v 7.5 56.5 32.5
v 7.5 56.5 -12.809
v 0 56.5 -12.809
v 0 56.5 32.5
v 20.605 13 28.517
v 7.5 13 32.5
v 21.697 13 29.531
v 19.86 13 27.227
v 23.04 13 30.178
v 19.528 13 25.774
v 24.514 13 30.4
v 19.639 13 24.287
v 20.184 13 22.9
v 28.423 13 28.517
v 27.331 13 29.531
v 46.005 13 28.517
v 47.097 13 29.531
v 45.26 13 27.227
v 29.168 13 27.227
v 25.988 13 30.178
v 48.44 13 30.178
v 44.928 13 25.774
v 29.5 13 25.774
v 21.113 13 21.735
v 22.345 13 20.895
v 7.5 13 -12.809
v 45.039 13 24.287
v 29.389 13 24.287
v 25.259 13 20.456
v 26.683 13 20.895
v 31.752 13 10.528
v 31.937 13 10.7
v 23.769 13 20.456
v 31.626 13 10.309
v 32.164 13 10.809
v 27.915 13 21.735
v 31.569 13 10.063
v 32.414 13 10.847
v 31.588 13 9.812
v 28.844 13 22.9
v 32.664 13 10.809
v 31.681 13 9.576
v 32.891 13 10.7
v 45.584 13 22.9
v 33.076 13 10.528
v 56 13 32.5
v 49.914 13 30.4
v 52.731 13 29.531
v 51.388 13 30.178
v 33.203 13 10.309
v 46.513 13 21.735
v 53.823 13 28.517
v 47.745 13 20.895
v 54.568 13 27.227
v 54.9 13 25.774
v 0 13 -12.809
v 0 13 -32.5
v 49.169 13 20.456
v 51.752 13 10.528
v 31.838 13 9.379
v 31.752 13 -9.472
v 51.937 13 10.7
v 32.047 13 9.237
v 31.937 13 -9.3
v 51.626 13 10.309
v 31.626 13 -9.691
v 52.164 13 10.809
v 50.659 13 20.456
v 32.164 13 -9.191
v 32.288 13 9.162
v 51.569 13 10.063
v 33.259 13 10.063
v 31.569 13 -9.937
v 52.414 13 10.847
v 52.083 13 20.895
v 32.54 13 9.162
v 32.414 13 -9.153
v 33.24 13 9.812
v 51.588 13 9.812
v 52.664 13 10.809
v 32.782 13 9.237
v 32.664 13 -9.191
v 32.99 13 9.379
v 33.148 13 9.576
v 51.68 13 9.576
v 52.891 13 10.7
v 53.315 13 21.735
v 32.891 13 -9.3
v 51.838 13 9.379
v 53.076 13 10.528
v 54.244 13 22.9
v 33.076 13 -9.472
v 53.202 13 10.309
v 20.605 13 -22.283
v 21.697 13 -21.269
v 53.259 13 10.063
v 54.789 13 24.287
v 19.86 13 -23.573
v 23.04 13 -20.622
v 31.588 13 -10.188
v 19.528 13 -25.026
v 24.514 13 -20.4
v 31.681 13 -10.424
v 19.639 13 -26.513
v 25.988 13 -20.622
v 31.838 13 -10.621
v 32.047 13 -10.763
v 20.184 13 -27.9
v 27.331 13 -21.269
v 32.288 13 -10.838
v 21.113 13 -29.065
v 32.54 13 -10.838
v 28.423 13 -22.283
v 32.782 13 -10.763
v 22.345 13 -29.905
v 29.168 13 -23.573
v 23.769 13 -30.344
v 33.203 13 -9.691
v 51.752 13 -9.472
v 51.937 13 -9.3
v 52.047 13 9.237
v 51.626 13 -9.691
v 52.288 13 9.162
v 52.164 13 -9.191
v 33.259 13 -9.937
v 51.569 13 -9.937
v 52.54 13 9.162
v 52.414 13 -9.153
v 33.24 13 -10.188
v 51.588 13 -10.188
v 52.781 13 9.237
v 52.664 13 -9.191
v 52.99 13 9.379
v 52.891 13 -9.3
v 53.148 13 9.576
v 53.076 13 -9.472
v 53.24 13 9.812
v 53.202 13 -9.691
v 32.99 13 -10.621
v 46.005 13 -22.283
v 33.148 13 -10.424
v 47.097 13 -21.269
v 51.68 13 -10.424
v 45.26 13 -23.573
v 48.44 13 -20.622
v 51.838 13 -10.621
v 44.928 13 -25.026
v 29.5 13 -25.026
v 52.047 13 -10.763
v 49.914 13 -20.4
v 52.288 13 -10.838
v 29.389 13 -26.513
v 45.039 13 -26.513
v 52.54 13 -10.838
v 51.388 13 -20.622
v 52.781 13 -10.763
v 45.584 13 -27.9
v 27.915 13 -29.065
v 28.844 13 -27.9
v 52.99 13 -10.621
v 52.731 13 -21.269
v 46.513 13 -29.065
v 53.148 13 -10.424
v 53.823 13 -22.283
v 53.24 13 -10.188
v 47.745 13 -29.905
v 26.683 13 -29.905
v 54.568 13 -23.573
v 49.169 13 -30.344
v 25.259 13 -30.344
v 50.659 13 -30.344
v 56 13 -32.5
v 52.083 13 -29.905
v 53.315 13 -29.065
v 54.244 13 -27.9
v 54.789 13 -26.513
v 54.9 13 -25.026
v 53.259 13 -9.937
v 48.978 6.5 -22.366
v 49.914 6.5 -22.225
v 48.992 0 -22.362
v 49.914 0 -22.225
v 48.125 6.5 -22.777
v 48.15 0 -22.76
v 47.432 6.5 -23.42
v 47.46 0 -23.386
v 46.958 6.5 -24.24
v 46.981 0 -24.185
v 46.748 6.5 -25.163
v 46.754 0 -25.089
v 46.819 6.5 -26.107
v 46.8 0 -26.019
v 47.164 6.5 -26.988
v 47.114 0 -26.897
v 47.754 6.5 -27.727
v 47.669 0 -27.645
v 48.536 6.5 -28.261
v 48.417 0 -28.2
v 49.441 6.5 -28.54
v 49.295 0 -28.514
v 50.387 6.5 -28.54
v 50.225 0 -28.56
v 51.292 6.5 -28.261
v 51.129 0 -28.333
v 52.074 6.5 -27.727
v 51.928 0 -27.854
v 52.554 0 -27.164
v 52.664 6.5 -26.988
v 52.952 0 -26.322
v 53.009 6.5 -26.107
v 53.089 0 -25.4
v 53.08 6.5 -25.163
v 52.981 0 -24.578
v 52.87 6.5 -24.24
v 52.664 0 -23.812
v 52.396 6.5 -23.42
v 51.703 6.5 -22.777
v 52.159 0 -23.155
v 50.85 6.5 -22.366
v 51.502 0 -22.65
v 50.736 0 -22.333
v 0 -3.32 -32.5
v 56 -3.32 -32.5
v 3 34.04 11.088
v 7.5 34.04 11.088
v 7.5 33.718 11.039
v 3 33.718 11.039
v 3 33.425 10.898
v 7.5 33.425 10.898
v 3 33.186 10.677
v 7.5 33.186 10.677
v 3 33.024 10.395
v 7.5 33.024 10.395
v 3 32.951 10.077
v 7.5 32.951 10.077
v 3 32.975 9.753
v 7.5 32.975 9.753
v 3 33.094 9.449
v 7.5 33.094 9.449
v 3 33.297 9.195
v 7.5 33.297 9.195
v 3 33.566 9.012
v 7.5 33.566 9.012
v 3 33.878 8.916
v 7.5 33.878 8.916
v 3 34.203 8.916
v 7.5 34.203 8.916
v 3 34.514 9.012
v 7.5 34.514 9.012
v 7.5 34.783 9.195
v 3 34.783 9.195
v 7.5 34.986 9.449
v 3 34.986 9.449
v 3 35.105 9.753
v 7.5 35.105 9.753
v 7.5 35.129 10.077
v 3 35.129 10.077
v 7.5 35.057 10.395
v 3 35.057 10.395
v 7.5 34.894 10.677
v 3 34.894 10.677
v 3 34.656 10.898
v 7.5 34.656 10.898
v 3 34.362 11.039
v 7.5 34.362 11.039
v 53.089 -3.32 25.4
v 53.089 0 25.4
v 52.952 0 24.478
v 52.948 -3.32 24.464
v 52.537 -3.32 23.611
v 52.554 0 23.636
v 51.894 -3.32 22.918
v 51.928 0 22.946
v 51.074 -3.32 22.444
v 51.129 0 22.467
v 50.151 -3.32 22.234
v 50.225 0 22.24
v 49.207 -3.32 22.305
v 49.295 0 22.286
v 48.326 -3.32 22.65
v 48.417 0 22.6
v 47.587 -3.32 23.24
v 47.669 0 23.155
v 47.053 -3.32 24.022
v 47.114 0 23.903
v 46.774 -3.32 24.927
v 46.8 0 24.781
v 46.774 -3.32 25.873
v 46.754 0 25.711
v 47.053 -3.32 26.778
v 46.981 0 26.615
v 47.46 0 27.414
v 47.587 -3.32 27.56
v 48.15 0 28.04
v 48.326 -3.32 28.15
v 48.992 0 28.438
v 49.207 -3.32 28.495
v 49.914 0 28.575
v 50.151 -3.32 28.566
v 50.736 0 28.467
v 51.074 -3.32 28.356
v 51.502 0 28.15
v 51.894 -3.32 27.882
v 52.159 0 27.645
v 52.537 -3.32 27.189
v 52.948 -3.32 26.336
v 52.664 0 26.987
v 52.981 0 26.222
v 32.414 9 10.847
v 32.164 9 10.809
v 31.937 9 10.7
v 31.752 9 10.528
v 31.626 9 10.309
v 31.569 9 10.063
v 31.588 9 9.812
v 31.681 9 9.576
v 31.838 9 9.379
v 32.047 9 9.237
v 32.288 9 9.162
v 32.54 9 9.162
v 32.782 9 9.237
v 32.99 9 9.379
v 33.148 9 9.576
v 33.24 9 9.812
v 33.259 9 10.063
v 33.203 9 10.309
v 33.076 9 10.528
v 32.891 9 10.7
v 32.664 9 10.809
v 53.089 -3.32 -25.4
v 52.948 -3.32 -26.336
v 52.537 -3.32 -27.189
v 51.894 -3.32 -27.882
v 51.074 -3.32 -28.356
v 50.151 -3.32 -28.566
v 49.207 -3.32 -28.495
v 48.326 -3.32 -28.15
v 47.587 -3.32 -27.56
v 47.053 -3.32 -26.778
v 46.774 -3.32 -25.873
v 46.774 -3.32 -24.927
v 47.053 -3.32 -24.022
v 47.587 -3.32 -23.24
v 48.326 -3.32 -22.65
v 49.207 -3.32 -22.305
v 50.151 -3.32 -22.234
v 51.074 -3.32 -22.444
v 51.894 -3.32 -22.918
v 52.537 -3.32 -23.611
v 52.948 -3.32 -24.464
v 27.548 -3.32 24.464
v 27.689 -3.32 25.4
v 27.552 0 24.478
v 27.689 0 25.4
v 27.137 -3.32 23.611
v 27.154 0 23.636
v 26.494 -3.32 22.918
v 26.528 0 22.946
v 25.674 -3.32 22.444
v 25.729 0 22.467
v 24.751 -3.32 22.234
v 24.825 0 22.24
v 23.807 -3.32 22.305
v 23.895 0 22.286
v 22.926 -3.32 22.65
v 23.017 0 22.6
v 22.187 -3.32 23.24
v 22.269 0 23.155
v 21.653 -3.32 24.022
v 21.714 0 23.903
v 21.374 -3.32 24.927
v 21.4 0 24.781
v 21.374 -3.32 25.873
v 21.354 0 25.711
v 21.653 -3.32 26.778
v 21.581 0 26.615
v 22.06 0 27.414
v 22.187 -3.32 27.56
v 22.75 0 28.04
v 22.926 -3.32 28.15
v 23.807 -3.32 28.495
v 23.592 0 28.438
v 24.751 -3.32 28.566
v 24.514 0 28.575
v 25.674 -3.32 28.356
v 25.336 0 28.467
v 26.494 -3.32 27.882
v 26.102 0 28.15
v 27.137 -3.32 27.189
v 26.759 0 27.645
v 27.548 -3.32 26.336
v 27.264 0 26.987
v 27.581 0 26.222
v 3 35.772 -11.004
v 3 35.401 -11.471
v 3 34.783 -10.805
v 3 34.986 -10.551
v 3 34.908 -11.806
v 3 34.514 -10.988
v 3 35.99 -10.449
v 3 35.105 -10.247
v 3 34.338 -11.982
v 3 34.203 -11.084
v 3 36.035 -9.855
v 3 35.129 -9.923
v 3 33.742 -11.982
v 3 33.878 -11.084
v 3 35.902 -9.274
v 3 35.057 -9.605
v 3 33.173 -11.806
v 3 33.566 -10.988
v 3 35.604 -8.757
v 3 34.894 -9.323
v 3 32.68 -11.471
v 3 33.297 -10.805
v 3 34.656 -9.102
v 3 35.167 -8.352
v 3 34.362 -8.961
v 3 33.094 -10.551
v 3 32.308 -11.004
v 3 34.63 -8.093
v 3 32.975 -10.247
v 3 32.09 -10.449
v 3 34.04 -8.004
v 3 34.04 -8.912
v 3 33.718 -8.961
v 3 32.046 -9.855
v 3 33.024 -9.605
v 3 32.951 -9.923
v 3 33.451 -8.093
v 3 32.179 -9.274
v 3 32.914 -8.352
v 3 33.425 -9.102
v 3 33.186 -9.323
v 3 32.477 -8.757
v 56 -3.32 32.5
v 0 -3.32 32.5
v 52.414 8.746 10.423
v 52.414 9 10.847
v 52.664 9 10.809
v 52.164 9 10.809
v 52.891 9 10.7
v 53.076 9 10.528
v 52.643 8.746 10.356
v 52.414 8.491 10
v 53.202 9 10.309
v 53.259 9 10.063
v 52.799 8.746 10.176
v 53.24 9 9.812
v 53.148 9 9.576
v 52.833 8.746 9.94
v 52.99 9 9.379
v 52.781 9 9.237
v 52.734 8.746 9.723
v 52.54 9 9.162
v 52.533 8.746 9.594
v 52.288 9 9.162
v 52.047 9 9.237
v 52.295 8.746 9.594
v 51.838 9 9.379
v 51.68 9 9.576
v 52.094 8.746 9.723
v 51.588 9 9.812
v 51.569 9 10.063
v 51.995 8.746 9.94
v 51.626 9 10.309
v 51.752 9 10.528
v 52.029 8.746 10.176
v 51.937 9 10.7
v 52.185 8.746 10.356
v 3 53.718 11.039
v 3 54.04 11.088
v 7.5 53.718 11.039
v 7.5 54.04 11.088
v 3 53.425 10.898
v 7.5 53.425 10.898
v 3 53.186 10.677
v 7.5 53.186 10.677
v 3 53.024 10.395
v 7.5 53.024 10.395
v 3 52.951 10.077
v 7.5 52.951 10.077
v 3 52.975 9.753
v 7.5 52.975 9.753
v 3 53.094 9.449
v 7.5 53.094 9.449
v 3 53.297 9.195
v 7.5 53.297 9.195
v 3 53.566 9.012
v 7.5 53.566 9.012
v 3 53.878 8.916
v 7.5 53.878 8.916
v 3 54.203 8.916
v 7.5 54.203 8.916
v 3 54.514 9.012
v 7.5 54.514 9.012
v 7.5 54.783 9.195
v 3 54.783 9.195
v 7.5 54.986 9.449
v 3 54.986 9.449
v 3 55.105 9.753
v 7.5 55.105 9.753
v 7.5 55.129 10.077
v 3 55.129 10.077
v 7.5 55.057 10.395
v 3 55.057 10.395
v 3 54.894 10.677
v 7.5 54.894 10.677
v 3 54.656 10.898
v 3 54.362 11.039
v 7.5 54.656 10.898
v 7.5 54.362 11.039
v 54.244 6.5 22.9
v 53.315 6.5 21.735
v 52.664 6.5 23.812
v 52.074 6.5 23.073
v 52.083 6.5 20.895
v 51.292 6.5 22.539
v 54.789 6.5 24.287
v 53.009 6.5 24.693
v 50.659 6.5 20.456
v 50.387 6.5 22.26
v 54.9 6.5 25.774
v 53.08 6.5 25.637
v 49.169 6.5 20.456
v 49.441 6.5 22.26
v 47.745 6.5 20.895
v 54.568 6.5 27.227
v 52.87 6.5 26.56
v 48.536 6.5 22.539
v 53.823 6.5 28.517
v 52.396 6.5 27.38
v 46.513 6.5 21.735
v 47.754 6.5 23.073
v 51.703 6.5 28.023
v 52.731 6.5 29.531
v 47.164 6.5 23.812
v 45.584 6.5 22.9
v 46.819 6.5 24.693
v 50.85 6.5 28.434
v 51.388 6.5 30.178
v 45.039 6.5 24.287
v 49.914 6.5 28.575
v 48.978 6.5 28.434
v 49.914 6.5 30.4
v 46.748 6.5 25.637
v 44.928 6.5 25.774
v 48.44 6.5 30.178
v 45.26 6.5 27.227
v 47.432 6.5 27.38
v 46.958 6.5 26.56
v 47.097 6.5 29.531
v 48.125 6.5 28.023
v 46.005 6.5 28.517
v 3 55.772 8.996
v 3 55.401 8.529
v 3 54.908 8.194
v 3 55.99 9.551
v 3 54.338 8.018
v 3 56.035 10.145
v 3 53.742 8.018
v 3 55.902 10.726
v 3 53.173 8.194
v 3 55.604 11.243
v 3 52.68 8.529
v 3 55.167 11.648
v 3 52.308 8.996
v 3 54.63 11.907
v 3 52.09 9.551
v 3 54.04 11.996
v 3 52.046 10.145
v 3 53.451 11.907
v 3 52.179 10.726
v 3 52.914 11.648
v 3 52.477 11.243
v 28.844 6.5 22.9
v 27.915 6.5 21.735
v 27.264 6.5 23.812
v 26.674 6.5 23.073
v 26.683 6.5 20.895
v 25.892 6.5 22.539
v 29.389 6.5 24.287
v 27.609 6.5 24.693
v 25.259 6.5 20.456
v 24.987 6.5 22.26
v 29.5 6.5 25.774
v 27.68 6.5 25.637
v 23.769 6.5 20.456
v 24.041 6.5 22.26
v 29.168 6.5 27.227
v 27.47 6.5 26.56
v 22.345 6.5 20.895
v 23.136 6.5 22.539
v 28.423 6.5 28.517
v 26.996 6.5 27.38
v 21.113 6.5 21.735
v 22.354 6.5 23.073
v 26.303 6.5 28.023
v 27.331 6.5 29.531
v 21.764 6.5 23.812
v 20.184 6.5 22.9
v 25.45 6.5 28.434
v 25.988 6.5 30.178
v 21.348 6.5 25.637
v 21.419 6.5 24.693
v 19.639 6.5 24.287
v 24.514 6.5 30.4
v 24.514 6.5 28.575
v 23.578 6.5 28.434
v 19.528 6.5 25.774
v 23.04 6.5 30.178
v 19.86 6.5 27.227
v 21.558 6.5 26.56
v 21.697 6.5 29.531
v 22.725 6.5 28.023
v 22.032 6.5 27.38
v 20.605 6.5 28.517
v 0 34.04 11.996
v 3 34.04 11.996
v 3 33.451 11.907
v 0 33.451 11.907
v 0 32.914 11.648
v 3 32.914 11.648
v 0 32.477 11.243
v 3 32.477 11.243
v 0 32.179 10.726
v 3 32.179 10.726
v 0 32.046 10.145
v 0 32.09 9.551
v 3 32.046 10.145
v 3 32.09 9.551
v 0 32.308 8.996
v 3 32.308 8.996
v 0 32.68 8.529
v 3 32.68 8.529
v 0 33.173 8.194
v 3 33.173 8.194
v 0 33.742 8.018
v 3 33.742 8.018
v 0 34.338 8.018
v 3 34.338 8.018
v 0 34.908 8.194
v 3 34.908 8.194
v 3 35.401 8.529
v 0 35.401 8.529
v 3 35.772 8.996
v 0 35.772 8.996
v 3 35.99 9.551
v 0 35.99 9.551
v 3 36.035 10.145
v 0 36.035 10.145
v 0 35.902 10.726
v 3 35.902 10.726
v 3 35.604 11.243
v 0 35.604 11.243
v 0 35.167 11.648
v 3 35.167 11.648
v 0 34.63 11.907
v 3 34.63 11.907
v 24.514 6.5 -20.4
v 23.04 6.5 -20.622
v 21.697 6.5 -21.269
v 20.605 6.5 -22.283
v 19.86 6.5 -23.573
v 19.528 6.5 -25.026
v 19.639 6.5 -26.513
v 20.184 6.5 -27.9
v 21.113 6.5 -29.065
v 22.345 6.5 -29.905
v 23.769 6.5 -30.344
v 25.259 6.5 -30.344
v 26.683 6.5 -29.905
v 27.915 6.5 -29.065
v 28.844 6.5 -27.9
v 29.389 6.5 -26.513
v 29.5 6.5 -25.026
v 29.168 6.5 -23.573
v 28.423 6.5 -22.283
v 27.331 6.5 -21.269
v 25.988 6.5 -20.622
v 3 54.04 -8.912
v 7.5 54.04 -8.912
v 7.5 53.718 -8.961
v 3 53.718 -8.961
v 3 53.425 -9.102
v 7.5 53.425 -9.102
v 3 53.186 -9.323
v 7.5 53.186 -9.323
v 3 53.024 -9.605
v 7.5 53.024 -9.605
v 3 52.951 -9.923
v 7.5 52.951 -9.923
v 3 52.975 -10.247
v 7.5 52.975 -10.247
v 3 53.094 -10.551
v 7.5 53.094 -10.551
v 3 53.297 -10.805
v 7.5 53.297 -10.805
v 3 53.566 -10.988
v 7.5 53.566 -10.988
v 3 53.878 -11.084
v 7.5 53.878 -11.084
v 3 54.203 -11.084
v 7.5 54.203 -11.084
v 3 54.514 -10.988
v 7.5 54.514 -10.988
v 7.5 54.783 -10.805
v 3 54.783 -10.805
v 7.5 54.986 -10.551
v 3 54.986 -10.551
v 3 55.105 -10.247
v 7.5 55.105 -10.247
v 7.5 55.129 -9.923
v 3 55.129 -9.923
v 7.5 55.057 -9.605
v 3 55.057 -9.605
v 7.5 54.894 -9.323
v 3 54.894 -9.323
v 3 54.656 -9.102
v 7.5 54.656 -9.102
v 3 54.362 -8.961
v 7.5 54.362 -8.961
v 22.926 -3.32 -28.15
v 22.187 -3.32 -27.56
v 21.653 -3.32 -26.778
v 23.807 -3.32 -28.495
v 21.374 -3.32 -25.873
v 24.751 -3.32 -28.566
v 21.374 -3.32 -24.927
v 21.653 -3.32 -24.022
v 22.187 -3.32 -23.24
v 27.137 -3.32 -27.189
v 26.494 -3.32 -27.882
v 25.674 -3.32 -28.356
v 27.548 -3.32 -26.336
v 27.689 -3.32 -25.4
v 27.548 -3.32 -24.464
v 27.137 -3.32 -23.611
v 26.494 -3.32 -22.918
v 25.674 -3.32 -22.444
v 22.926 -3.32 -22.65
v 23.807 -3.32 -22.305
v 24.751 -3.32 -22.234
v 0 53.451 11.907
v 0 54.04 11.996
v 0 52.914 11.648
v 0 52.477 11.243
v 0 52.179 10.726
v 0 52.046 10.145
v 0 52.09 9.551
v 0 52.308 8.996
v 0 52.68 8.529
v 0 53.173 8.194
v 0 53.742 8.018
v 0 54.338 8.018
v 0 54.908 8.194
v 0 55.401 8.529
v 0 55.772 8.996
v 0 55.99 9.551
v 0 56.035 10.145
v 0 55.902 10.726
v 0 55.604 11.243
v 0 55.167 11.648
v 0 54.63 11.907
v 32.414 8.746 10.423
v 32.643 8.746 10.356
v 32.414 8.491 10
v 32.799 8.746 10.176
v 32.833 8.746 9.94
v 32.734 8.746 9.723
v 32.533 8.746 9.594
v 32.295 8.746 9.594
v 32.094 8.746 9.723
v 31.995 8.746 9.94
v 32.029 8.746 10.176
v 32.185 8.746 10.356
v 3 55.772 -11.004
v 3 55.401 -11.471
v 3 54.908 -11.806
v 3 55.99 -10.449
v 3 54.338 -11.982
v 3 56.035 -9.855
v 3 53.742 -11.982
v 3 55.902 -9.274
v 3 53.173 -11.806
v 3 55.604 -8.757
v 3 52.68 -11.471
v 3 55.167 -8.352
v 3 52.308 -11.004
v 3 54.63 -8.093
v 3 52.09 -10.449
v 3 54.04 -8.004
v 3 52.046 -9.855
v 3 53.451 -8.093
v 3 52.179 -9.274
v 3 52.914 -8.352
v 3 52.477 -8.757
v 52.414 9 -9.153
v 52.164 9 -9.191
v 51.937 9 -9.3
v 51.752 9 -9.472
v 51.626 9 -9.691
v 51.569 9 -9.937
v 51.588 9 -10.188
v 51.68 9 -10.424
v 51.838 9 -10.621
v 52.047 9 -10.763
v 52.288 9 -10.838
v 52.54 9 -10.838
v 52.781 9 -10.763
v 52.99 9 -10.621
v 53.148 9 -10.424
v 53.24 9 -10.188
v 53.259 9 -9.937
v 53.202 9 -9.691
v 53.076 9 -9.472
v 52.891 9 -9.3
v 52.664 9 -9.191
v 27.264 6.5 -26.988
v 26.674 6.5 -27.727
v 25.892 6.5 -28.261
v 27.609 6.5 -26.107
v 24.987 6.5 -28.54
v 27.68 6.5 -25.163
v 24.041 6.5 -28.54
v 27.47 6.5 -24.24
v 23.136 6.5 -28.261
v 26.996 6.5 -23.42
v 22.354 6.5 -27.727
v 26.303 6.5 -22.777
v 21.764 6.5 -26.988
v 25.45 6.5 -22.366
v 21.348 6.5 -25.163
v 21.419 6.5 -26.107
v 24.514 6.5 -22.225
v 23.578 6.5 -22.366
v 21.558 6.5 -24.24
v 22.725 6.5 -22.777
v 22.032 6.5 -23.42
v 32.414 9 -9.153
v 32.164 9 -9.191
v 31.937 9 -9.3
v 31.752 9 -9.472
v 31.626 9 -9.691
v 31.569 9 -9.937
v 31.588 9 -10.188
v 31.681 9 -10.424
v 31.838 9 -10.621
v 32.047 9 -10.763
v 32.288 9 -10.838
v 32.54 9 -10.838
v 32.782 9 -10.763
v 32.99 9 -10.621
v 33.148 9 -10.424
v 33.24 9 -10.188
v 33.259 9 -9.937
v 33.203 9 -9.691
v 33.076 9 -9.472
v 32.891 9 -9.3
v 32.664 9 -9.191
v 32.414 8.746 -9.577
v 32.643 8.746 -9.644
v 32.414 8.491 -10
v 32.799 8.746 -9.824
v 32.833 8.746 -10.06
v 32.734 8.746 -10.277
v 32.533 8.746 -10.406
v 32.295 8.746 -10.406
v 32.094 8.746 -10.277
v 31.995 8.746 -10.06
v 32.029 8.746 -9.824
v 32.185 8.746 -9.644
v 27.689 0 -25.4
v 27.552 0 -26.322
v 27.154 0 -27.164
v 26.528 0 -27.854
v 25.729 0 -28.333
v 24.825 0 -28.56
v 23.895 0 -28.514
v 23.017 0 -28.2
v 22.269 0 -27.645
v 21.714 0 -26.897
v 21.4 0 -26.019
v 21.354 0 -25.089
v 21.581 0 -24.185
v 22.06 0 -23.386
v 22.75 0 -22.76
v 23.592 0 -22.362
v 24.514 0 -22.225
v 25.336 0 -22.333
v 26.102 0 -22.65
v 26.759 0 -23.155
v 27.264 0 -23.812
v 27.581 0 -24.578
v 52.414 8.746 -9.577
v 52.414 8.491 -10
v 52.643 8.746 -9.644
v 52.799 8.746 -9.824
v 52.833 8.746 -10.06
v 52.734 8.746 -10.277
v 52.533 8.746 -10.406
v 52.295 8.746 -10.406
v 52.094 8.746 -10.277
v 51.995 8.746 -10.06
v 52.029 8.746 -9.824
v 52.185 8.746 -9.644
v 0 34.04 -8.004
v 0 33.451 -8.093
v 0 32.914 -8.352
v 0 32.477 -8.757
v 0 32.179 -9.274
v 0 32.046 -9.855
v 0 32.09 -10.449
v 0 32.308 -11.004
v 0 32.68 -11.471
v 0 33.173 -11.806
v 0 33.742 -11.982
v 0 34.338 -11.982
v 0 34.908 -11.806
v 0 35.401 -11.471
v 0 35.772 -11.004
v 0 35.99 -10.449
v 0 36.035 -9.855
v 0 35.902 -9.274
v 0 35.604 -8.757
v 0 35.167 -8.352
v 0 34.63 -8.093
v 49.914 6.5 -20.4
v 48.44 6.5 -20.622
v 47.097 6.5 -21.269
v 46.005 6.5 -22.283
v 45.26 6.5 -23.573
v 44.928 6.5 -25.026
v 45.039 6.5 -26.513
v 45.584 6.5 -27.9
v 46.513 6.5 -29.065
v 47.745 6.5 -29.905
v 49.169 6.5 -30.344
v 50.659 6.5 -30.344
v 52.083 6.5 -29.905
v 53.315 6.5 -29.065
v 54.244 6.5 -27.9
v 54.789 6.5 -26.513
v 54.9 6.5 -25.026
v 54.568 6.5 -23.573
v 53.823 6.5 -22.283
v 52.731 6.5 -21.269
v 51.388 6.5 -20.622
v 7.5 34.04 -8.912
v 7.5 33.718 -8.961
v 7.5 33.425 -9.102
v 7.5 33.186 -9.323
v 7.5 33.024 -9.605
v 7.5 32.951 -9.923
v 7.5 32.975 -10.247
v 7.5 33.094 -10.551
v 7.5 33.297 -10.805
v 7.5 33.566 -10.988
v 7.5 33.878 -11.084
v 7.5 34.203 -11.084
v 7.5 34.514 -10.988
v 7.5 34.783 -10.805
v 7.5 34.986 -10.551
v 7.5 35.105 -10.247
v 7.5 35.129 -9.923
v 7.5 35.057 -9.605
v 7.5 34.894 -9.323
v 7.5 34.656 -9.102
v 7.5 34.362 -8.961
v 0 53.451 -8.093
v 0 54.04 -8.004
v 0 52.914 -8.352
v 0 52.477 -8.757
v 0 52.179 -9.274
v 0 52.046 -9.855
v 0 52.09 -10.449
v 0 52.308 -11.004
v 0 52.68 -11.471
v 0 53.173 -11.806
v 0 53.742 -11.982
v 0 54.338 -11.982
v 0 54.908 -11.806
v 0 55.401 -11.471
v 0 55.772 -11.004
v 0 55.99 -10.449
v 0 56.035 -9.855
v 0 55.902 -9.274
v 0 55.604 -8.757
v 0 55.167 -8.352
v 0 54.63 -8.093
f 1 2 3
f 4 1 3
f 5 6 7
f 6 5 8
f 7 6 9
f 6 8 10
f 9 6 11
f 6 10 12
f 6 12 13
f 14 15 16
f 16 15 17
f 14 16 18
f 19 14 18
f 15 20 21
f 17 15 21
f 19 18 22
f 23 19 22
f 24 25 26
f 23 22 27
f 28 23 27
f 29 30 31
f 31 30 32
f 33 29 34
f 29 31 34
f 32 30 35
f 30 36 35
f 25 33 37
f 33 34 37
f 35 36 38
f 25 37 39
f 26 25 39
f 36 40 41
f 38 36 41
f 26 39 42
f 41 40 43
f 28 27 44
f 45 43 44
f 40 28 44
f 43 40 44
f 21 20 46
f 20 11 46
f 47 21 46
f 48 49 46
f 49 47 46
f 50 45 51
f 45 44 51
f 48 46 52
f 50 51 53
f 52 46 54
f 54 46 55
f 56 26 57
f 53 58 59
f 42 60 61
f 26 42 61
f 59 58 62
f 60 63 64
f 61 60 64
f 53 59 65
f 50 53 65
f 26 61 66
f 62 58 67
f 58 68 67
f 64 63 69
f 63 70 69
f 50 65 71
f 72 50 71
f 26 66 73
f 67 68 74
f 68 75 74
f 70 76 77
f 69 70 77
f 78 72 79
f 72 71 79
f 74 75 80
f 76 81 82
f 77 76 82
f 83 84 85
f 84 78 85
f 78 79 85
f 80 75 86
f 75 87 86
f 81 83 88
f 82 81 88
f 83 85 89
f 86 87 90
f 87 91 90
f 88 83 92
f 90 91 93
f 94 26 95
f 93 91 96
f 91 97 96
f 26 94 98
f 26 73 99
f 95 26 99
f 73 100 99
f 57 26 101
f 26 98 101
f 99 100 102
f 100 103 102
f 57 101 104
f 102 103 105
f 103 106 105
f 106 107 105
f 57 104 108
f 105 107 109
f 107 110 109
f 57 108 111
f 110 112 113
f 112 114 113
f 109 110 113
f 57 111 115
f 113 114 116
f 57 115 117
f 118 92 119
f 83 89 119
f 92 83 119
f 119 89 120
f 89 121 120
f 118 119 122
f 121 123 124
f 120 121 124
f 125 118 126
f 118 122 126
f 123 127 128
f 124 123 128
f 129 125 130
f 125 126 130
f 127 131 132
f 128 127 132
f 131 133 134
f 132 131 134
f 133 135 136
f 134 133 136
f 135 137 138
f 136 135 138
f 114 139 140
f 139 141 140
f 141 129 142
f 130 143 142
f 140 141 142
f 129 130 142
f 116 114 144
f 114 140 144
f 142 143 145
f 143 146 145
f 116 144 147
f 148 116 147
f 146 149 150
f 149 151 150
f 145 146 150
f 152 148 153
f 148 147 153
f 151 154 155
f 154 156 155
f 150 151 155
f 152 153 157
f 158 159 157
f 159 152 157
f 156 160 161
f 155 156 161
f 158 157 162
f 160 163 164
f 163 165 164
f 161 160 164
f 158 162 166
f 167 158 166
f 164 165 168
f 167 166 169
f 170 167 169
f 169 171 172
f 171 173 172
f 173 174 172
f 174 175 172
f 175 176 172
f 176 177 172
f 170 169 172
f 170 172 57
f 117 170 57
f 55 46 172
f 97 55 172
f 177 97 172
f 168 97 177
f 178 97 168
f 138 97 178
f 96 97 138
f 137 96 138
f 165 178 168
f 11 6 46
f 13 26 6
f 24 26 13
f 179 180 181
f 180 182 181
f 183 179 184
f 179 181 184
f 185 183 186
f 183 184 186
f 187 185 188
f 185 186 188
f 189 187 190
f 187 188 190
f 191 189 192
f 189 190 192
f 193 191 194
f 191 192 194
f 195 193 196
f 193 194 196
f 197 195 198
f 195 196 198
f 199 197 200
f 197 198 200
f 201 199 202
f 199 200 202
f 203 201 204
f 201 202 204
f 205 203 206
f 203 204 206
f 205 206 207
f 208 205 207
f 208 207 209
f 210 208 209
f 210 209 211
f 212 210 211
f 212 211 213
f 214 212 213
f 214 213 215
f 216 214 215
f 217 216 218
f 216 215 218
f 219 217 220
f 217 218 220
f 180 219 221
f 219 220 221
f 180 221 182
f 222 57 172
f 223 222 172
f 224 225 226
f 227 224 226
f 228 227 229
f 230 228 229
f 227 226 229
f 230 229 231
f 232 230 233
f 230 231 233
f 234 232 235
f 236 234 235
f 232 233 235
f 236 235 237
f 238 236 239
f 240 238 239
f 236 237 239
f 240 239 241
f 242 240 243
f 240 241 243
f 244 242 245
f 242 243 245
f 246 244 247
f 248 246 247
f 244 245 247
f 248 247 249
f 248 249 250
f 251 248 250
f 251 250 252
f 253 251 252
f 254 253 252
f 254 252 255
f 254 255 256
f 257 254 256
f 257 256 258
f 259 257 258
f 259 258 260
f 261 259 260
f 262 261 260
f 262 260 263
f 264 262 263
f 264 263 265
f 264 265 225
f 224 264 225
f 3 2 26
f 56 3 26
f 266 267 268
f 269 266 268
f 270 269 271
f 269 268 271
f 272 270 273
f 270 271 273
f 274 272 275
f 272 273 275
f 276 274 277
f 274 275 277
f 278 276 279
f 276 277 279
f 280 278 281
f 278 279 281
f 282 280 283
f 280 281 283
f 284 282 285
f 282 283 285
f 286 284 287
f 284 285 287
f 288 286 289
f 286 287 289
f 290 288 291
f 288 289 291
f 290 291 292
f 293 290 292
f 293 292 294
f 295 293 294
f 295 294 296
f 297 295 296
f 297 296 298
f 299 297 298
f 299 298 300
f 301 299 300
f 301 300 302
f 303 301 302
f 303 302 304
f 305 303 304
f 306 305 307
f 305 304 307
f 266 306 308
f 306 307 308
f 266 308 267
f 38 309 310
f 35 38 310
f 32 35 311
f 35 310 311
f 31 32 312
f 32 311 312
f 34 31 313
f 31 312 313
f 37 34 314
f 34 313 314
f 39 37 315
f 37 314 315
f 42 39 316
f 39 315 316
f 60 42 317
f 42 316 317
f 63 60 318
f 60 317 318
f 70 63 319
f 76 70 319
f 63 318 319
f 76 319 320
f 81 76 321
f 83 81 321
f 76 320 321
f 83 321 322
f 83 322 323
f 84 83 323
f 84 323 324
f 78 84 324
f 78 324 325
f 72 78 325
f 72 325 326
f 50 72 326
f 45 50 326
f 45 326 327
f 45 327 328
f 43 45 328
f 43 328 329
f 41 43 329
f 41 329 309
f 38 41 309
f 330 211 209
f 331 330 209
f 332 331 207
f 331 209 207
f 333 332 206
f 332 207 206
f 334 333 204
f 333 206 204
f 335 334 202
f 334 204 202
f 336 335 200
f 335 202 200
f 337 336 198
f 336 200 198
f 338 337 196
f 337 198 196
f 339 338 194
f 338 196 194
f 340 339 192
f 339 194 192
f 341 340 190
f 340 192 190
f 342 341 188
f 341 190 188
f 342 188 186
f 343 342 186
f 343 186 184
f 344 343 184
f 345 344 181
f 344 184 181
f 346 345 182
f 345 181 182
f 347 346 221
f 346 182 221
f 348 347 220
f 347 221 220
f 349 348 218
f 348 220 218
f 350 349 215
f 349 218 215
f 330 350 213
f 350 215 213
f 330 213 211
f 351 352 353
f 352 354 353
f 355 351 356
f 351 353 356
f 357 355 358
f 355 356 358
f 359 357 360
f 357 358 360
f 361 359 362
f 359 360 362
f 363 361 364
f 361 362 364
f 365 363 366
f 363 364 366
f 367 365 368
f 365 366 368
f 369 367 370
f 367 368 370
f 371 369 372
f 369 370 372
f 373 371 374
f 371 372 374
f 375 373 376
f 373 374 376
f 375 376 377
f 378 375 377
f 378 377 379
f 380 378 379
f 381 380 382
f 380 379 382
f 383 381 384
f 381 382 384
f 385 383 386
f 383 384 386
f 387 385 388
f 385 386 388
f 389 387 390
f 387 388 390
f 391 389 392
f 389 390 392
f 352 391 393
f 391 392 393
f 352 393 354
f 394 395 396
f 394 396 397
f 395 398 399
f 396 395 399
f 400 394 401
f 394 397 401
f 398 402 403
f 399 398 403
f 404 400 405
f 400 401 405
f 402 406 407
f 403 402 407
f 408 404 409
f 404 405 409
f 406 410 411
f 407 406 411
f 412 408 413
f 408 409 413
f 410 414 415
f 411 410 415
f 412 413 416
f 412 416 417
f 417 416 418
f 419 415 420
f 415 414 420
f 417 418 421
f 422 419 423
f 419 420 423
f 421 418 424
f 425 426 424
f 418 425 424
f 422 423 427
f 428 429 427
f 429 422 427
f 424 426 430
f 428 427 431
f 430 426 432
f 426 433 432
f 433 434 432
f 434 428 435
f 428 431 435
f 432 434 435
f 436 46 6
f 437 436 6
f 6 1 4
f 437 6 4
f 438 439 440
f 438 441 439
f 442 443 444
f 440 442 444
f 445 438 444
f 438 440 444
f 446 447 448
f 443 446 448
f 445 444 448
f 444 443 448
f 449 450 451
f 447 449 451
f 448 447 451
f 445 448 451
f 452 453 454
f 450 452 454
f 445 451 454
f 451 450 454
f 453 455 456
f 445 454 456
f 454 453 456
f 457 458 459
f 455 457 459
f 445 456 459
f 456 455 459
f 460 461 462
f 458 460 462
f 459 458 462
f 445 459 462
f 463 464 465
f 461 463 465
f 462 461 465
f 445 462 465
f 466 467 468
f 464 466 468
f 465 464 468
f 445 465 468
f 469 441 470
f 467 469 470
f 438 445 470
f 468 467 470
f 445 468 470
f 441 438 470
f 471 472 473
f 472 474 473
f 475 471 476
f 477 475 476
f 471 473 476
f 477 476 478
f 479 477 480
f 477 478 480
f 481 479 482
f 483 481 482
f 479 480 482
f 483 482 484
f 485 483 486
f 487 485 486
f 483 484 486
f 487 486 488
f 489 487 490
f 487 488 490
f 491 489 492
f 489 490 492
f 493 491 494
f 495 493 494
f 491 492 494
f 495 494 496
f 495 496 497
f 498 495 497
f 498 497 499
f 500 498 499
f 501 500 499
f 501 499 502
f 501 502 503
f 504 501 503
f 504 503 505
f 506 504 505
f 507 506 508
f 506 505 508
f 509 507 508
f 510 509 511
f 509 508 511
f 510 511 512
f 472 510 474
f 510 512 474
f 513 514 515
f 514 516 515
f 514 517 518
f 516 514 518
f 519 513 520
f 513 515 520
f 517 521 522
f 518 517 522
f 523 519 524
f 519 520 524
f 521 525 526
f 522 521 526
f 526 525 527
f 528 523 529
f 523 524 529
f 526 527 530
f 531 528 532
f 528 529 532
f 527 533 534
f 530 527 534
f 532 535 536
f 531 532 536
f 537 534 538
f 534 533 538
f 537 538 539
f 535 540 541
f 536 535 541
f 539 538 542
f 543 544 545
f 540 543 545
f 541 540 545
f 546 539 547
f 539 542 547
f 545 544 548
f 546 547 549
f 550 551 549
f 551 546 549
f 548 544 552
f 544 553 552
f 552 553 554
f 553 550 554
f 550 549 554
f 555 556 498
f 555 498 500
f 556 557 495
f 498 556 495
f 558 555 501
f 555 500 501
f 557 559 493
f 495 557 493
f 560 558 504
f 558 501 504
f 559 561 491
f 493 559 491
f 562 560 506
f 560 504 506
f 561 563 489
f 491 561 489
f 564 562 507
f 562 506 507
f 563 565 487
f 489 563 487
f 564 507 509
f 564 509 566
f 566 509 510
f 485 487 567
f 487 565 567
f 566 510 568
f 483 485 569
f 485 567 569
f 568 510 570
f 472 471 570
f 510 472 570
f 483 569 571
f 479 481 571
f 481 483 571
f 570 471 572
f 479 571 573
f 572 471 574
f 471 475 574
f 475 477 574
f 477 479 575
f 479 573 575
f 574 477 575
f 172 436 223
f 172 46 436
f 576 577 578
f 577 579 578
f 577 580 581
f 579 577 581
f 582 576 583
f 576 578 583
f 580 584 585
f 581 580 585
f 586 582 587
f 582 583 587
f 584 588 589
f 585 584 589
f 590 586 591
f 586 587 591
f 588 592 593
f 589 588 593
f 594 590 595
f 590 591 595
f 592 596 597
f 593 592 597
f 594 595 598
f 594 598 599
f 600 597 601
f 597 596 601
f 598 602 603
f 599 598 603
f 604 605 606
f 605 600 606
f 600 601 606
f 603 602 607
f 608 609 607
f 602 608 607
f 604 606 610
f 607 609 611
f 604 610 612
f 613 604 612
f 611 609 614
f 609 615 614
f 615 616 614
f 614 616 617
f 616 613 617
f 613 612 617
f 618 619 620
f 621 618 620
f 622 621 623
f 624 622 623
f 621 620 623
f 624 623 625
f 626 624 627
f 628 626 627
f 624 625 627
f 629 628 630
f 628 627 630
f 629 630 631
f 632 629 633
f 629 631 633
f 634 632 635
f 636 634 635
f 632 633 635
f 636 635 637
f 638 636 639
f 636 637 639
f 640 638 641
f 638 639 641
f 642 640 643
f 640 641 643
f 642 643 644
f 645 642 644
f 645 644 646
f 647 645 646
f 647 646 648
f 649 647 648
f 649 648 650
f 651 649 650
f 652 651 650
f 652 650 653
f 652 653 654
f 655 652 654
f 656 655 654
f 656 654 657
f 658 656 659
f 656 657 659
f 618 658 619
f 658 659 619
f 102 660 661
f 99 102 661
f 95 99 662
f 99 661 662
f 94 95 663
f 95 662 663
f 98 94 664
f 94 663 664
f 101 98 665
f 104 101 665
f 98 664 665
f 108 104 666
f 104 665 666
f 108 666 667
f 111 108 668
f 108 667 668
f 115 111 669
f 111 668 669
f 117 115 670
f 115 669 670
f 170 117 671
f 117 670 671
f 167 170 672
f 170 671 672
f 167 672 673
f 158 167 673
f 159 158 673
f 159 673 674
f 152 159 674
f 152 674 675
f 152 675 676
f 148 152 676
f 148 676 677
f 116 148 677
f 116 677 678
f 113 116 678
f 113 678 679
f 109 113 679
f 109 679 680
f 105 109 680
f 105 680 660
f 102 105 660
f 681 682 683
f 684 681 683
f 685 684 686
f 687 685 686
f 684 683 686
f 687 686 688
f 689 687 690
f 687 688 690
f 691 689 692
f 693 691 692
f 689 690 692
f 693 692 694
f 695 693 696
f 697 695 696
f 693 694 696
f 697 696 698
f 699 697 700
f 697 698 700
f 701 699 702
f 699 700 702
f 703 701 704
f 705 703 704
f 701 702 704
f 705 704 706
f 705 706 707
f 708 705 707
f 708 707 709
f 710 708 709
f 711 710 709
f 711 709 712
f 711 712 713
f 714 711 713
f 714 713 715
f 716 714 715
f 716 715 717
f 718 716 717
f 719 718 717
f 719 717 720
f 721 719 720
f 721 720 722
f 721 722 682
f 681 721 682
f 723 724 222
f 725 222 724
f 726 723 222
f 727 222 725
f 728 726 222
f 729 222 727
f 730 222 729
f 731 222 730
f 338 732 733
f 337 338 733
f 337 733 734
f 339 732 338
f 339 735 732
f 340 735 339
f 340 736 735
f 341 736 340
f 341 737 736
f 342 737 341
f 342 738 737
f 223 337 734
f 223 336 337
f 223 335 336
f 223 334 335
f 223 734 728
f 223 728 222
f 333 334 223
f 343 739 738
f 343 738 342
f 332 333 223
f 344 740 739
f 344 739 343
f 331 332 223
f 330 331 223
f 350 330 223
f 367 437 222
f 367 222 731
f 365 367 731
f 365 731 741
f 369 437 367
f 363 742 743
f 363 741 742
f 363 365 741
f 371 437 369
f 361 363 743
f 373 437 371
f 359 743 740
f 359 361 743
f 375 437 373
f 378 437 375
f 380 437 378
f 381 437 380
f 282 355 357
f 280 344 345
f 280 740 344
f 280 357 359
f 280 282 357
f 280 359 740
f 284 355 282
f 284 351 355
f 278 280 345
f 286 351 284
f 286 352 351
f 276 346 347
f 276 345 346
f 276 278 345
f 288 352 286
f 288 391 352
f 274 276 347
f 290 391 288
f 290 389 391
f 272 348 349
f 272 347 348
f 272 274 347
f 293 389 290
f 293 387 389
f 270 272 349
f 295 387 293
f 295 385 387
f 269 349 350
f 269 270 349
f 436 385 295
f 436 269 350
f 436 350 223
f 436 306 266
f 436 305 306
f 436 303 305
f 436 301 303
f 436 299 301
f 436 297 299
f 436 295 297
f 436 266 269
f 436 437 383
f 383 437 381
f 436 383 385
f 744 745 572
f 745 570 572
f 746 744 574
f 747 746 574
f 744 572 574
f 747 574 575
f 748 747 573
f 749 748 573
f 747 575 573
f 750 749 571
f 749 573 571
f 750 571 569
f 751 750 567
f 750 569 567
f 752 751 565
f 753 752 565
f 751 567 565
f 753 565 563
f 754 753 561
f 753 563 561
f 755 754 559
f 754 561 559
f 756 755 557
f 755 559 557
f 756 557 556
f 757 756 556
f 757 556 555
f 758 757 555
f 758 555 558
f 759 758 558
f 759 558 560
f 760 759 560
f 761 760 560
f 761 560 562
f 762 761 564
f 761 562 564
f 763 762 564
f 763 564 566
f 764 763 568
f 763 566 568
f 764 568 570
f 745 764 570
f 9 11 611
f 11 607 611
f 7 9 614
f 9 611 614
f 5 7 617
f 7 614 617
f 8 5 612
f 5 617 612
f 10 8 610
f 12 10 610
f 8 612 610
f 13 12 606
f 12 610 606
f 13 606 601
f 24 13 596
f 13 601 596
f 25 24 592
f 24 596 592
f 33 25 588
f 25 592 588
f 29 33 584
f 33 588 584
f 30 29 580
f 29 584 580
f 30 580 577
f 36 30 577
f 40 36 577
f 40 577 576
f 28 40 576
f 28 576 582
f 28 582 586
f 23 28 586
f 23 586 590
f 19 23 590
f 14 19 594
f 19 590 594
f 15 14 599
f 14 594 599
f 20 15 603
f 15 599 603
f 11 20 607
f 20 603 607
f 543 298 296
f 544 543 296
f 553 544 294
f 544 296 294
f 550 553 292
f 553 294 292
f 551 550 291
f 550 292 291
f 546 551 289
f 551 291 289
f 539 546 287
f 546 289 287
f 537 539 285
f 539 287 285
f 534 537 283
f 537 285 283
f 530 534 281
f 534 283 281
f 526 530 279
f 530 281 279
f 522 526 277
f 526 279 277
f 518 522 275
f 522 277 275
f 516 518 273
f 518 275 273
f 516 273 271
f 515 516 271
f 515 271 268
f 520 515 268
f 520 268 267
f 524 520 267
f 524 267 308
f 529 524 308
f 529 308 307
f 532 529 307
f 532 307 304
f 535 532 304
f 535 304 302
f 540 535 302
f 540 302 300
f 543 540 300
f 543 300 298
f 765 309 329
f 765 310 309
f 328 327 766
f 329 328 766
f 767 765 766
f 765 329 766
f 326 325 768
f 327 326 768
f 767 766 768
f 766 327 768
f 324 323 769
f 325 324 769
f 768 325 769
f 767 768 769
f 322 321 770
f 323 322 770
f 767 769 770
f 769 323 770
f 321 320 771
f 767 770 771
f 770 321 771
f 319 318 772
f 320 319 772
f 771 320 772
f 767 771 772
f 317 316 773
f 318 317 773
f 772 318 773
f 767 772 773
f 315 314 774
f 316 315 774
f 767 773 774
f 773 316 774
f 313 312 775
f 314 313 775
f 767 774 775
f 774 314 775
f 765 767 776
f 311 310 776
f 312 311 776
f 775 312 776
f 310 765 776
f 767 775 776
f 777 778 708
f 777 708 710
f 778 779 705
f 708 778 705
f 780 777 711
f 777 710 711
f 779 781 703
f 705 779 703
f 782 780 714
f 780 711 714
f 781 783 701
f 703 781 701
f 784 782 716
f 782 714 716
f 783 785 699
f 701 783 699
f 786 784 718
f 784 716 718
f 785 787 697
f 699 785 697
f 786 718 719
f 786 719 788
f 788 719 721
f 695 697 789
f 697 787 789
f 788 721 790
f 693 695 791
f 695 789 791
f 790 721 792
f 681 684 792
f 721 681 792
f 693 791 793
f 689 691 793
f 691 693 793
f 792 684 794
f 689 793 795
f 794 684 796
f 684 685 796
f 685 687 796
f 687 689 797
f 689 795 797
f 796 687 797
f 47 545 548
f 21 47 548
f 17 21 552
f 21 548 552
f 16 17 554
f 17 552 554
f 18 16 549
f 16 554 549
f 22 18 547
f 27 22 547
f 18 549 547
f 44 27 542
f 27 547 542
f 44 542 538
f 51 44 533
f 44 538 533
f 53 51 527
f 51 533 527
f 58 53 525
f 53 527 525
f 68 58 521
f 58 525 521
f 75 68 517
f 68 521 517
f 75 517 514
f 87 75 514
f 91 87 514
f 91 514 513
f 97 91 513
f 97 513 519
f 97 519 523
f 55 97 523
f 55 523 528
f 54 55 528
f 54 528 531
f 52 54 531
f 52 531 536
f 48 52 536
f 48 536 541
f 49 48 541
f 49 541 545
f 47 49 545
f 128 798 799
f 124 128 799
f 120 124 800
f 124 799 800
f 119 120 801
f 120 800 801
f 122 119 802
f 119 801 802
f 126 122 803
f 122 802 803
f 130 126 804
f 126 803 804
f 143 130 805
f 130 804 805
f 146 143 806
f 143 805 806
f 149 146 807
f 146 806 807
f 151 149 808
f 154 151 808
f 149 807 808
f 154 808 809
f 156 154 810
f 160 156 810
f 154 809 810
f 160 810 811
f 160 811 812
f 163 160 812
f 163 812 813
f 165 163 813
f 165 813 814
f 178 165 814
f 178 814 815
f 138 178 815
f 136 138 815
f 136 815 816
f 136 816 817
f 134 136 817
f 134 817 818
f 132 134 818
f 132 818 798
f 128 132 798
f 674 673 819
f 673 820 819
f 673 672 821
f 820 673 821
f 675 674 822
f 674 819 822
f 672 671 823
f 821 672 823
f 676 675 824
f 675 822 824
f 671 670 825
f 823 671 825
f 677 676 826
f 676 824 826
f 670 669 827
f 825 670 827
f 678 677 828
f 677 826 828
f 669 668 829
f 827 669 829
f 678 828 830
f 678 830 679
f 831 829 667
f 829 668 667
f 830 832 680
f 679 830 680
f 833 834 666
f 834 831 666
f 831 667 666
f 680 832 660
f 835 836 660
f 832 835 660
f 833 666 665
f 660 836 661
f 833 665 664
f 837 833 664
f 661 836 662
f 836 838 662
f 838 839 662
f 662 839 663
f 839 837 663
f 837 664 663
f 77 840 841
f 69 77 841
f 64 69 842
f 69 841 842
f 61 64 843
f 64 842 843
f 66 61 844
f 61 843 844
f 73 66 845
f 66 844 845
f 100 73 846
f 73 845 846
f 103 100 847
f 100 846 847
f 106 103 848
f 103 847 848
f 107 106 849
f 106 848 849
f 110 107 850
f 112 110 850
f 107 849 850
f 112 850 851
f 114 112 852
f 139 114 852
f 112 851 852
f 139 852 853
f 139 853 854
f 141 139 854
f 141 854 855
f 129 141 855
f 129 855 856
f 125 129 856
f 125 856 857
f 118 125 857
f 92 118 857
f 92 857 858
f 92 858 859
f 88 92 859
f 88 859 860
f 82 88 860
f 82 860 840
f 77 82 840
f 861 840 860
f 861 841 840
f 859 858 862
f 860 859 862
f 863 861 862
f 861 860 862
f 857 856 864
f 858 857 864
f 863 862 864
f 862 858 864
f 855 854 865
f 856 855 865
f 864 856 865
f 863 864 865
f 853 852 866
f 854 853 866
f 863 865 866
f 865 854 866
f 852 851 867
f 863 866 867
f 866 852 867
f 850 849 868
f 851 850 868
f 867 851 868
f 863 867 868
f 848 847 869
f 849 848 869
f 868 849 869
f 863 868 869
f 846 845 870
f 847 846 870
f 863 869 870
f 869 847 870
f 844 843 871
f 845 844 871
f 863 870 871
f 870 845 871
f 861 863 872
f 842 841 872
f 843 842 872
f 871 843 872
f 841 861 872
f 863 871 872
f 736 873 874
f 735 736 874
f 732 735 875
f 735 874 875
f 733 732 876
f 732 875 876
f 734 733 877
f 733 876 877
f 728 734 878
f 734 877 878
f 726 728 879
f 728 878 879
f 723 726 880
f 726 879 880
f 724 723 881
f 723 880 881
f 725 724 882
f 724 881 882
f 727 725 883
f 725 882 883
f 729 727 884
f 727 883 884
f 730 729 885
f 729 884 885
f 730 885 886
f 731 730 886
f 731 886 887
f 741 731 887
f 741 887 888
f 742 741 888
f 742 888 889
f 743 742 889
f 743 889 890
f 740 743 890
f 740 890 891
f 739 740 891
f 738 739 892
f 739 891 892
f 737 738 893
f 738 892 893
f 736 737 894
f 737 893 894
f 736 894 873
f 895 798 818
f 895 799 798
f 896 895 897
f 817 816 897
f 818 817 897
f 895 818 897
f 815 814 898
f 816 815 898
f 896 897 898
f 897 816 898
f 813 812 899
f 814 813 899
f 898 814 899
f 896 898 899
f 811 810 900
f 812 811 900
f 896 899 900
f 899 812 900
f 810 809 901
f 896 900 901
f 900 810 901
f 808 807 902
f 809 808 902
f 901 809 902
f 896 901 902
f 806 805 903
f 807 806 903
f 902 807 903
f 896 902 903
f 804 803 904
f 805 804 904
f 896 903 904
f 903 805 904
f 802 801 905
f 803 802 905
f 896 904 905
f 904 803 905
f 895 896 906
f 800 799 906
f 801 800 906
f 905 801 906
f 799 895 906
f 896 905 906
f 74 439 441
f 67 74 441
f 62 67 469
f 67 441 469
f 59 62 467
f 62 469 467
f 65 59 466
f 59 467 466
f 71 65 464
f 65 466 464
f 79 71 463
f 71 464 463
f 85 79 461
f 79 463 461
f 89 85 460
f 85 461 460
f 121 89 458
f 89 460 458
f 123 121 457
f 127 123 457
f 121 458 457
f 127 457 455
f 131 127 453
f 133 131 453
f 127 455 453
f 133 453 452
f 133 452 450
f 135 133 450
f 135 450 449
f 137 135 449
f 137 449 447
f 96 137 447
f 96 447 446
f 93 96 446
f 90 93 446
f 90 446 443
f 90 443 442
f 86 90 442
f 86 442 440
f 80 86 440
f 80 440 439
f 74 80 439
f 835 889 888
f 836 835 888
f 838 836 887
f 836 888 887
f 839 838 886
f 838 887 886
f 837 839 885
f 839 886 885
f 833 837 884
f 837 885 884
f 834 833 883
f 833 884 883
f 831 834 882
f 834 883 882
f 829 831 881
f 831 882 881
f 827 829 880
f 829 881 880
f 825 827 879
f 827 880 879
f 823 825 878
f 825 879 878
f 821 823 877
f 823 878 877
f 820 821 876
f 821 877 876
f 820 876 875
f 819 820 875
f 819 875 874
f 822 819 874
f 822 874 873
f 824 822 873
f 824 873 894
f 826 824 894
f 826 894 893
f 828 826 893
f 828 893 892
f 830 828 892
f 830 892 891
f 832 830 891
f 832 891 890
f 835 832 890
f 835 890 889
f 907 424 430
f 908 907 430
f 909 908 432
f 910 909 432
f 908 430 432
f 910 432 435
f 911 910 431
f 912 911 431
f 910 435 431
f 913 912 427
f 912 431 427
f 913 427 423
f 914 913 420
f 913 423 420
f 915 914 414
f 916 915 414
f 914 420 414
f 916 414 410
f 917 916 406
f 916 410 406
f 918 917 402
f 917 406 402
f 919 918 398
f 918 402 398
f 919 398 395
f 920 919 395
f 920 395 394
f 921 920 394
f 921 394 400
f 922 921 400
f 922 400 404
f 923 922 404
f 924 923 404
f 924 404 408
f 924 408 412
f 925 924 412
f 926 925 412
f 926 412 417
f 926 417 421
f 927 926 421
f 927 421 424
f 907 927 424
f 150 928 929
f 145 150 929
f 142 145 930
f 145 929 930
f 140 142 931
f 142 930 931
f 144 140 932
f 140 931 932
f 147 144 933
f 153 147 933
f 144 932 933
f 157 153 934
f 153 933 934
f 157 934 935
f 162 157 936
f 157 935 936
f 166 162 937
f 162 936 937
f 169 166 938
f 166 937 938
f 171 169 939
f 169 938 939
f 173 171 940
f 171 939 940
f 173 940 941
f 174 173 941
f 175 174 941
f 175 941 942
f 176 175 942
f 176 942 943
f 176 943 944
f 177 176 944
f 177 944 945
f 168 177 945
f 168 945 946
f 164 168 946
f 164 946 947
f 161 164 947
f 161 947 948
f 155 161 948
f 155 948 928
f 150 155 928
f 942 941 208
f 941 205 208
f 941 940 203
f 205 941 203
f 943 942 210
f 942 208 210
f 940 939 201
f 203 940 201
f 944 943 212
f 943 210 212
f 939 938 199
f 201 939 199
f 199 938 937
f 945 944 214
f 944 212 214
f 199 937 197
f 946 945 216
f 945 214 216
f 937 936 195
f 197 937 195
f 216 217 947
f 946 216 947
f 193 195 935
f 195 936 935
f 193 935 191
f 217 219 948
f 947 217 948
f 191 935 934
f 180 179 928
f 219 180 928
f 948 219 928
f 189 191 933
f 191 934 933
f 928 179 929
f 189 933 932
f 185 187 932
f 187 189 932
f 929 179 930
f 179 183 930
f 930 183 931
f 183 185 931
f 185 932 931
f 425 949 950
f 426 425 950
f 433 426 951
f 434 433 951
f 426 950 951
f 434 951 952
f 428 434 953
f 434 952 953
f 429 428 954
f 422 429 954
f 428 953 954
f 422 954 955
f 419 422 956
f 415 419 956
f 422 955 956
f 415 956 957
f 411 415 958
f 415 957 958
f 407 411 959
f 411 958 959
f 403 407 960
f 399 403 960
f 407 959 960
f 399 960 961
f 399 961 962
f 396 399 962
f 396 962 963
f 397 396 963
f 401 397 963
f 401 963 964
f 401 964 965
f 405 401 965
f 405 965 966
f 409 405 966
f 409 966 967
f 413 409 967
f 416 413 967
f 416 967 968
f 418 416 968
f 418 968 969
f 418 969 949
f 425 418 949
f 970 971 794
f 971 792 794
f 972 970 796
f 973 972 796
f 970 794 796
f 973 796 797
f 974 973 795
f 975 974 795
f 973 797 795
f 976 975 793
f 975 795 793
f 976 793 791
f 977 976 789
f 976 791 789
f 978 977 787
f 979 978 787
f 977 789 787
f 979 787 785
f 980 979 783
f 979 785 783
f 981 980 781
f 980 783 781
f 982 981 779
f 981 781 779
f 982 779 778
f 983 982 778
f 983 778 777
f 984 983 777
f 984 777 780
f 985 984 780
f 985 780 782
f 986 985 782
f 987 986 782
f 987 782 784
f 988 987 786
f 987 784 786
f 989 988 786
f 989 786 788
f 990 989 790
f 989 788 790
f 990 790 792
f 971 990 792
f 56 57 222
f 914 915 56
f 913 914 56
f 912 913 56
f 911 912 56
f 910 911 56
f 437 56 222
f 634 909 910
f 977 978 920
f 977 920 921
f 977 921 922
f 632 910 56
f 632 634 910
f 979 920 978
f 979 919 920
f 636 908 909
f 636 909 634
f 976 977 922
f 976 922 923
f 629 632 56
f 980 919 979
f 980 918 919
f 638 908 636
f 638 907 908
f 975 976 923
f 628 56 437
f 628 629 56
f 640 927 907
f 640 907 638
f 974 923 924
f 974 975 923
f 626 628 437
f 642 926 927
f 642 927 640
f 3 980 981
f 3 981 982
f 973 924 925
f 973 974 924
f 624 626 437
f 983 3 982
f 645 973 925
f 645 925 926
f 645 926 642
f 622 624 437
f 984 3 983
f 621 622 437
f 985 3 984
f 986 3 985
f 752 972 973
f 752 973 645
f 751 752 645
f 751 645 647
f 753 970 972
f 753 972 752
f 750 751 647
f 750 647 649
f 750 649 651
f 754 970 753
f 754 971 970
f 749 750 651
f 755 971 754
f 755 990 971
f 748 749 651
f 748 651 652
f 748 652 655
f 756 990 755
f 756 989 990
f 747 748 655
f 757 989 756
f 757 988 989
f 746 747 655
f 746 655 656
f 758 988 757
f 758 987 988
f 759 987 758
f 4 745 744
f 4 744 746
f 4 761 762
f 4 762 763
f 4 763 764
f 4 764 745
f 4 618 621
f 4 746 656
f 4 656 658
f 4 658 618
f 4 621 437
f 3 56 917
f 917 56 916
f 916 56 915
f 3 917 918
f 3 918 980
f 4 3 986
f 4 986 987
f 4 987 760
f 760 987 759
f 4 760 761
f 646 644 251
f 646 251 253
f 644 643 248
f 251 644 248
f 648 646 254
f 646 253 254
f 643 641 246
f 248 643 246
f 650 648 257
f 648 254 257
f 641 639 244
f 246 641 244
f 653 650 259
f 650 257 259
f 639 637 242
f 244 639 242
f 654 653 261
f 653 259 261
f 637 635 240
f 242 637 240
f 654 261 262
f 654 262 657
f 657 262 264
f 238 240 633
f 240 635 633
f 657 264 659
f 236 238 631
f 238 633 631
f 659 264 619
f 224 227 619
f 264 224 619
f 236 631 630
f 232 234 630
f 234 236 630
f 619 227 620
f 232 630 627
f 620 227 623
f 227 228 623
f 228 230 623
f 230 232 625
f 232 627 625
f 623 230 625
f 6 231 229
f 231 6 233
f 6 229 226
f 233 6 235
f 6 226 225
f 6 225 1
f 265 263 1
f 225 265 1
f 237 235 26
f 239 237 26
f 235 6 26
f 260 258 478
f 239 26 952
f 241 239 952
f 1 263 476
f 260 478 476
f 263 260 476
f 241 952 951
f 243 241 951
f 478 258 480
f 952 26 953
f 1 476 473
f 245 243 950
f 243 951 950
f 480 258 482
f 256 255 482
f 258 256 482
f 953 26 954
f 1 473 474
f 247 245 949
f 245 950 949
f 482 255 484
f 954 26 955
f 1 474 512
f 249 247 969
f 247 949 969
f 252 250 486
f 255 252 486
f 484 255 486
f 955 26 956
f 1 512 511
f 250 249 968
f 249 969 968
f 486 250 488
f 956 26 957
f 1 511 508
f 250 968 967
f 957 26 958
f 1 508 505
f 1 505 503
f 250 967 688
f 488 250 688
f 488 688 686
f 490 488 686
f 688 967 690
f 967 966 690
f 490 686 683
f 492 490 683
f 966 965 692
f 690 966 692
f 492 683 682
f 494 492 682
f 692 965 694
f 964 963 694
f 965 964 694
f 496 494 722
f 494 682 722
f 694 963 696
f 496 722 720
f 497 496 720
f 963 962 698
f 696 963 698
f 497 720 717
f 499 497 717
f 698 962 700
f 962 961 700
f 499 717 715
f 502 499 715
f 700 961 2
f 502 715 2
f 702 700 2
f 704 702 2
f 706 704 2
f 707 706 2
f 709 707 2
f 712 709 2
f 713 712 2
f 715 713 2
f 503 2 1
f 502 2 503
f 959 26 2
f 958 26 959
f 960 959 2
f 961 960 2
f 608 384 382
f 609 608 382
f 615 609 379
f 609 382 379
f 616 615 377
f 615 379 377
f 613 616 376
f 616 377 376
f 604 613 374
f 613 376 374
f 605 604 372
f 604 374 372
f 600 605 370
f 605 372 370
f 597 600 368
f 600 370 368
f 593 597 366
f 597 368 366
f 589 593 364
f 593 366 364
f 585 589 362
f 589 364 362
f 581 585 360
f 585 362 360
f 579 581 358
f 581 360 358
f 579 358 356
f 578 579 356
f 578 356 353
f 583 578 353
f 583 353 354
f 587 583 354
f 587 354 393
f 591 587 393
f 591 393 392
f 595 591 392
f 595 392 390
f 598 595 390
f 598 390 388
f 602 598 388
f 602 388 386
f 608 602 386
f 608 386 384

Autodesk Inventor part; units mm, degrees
ref_plane "YZ Plane" through (0, 0, 0) normal (1, 0, 0) x (0, 1, 0)
ref_plane "XZ Plane" through (0, 0, 0) normal (0, 1, 0) x (-1, 0, 0)
ref_plane "XY Plane" through (0, 0, 0) normal (0, 0, 1) x (1, 0, 0)
sketch "Sketch1" plane through (0, 0, 0) normal (0, 0, 1) x (1, 0, 0)
  line L0 (0, 0) -> (7.5, 0)
  line L1 (7.5, 13) -> (7.5, 56.5)
  line L2 (7.5, 56.5) -> (0, 56.5)
  line L3 (0, 56.5) -> (0, 0)
  line L4 (0, 0) -> (56, 0)
  line L5 (56, 0) -> (56, 13)
  line L6 (56, 13) -> (7.5, 13)
  line L7 (0, 13) -> (0, 0)
  dimension "d0" = 13
  dimension "d1" = 56
  dimension "d2" = 56.5
  dimension "d3" = 7.5
extrude "Extrusion1" add sketch "Sketch1" along normal mid plane 65
sketch "Sketch2" plane through (7.5, 13, 32.5) normal (0, 1, 0) x (1, 0, 0)
  line L0 (0, 0) -> (48.5, 0) projected
  line L1 (48.5, 0) -> (48.5, 65) projected
  line L2 (48.5, 65) -> (0, 65) projected
  line L3 (0, 0) -> (0, 65) projected
  line L4 (42.414, 25.5) -> (42.414, 39.5)
  line L5 (49.414, 32.5) -> (35.414, 32.5)
  point P0 (-7.5, 32.5)
  point P1 (17.014, 57.9)
  point P2 (17.014, 7.1)
  point P3 (42.414, 57.9)
  point P4 (42.414, 7.1)
  dimension "d6" = 25.4
  dimension "d7" = 25.4
  dimension "d8" = 25.4
  dimension "d9" = 25.4
  dimension "d10" = 25.4
  dimension "d11" = 25.4
  dimension "d35" = 25.4
hole "Hole1" at (24.514, 13, -25.4) at (24.514, 13, 25.4) at (49.914, 13, -25.4) at (49.914, 13, 25.4) direction (0, -1, 0) diameter 6.35 end through all counterbore diameter 10 counterbore depth 6.5
sketch "Sketch3" plane through (7.5, 13, 32.5) normal (0, 1, 0) x (1, 0, 0)
  circle A0 centre (24.9141, 42.5) radius 2.032 projected
  circle A1 centre (24.9141, 22.5) radius 2.032 projected
  circle A2 centre (44.914, 22.5) radius 1.143 projected
  circle A3 centre (44.914, 42.5) radius 1.143 projected
  point P0 (-7.5, 32.5)
hole "Hole2" at (52.414, 13, -10) at (52.414, 13, 10) at (32.4141, 13, 10) at (32.4141, 13, -10) direction (0, -1, 0) diameter 1.694 depth 4 tip angle 118 thread size "2-56 UNC" class "2B" standard "ANSI Unified Screw Threads"
sketch "Sketch4" plane through (0, 0, 32.5) normal (-1, 0, 0) x (0, 0, 1)
  line L0 (0, 56.5) -> (0, 13) projected
  line L1 (0, 13) -> (-65, 13) projected
  line L2 (-65, 13) -> (-65, 56.5) projected
  line L3 (0, 56.5) -> (-65, 56.5) projected
  circle A0 centre (-42.5044, 54.0403) radius 0.889 projected
  circle A1 centre (-22.5044, 34.0403) radius 0.889 projected
  circle A2 centre (-22.5044, 54.0403) radius 1.0922 projected
  line L4 (-45.0044, 32.0483) -> (-45.0044, 31.5403) projected
  line L5 (-45.0044, 31.5403) -> (-20.0044, 31.5403) projected
  line L6 (-20.0044, 31.5403) -> (-20.0044, 56.5403) projected
  line L7 (-20.0044, 56.5403) -> (-45.0044, 56.5403) projected
  line L8 (-45.0044, 56.5403) -> (-45.0044, 56.0323) projected
  line L9 (-45.0044, 56.0323) -> (-45.3092, 56.0323) projected
  line L10 (-45.3092, 32.0483) -> (-45.3092, 56.0323) projected
  line L11 (-45.0044, 32.0483) -> (-45.3092, 32.0483) projected
  circle A3 centre (-42.5044, 34.0403) radius 0.889 projected
  circle A4 centre (-22.5044, 34.0403) radius 0.889 projected
  circle A5 centre (-42.5044, 54.0403) radius 0.889 projected
  circle A6 centre (-22.5044, 54.0403) radius 0.889 projected
  circle A7 centre (-38.8544, 37.6903) radius 1.7272 projected
  circle A8 centre (-26.1544, 37.6903) radius 1.7272 projected
  circle A9 centre (-38.8544, 50.3903) radius 1.7272 projected
  circle A10 centre (-26.1544, 50.3903) radius 1.7272 projected
  circle A11 centre (-32.5044, 44.0403) radius 1.7272 projected
  point P0 (-32.5, 0)
hole "Hole3" at (0, 54.0403, -10.0044) at (0, 54.0403, 9.9956) at (0, 34.0403, 9.9956) at (0, 34.0403, -10.0044) direction (1, 0, 0) diameter 2.1844 end through all counterbore diameter 4 counterbore depth 3
sketch "Sketch5" plane through (7.5, 13, 32.5) normal (1, 0, 0) x (0, 0, -1)
  line L0 (0, 0) -> (65, 0) projected
  line L1 (45.3092, 19.0483) -> (45.3092, 43.0323) projected
  line L2 (65, 43.5) -> (45.3092, 43.5)
  line L3 (45.3092, 43.5) -> (45.3092, 0)
  line L4 (45.3092, 0) -> (65, 0)
  line L5 (65, 0) -> (65, 43.5)
  point P0 (32.5, -13)
extrude "Extrusion2" cut sketch "Sketch5" against normal blind 10
sketch "Sketch6" plane through (0, 0, 32.5) normal (0, -1, 0) x (1, 0, 0)
  circle A0 centre (49.914, -7.1) radius 3.175 projected
  circle A1 centre (49.914, -57.9) radius 3.175 projected
  circle A2 centre (24.514, -7.1) radius 3.175 projected
  circle A3 centre (24.514, -57.9) radius 3.175 projected
  line L0 (56, 0) -> (0, 0) projected
  line L1 (0, -65) -> (0, 0) projected
  line L2 (0, -65) -> (56, -65) projected
  line L3 (56, 0) -> (56, -65) projected
  point P0 (0, -32.5)
extrude "Extrusion3" add sketch "Sketch6" along normal blind 3.3198
properties part number "beam steering subassy mounting bracket"
